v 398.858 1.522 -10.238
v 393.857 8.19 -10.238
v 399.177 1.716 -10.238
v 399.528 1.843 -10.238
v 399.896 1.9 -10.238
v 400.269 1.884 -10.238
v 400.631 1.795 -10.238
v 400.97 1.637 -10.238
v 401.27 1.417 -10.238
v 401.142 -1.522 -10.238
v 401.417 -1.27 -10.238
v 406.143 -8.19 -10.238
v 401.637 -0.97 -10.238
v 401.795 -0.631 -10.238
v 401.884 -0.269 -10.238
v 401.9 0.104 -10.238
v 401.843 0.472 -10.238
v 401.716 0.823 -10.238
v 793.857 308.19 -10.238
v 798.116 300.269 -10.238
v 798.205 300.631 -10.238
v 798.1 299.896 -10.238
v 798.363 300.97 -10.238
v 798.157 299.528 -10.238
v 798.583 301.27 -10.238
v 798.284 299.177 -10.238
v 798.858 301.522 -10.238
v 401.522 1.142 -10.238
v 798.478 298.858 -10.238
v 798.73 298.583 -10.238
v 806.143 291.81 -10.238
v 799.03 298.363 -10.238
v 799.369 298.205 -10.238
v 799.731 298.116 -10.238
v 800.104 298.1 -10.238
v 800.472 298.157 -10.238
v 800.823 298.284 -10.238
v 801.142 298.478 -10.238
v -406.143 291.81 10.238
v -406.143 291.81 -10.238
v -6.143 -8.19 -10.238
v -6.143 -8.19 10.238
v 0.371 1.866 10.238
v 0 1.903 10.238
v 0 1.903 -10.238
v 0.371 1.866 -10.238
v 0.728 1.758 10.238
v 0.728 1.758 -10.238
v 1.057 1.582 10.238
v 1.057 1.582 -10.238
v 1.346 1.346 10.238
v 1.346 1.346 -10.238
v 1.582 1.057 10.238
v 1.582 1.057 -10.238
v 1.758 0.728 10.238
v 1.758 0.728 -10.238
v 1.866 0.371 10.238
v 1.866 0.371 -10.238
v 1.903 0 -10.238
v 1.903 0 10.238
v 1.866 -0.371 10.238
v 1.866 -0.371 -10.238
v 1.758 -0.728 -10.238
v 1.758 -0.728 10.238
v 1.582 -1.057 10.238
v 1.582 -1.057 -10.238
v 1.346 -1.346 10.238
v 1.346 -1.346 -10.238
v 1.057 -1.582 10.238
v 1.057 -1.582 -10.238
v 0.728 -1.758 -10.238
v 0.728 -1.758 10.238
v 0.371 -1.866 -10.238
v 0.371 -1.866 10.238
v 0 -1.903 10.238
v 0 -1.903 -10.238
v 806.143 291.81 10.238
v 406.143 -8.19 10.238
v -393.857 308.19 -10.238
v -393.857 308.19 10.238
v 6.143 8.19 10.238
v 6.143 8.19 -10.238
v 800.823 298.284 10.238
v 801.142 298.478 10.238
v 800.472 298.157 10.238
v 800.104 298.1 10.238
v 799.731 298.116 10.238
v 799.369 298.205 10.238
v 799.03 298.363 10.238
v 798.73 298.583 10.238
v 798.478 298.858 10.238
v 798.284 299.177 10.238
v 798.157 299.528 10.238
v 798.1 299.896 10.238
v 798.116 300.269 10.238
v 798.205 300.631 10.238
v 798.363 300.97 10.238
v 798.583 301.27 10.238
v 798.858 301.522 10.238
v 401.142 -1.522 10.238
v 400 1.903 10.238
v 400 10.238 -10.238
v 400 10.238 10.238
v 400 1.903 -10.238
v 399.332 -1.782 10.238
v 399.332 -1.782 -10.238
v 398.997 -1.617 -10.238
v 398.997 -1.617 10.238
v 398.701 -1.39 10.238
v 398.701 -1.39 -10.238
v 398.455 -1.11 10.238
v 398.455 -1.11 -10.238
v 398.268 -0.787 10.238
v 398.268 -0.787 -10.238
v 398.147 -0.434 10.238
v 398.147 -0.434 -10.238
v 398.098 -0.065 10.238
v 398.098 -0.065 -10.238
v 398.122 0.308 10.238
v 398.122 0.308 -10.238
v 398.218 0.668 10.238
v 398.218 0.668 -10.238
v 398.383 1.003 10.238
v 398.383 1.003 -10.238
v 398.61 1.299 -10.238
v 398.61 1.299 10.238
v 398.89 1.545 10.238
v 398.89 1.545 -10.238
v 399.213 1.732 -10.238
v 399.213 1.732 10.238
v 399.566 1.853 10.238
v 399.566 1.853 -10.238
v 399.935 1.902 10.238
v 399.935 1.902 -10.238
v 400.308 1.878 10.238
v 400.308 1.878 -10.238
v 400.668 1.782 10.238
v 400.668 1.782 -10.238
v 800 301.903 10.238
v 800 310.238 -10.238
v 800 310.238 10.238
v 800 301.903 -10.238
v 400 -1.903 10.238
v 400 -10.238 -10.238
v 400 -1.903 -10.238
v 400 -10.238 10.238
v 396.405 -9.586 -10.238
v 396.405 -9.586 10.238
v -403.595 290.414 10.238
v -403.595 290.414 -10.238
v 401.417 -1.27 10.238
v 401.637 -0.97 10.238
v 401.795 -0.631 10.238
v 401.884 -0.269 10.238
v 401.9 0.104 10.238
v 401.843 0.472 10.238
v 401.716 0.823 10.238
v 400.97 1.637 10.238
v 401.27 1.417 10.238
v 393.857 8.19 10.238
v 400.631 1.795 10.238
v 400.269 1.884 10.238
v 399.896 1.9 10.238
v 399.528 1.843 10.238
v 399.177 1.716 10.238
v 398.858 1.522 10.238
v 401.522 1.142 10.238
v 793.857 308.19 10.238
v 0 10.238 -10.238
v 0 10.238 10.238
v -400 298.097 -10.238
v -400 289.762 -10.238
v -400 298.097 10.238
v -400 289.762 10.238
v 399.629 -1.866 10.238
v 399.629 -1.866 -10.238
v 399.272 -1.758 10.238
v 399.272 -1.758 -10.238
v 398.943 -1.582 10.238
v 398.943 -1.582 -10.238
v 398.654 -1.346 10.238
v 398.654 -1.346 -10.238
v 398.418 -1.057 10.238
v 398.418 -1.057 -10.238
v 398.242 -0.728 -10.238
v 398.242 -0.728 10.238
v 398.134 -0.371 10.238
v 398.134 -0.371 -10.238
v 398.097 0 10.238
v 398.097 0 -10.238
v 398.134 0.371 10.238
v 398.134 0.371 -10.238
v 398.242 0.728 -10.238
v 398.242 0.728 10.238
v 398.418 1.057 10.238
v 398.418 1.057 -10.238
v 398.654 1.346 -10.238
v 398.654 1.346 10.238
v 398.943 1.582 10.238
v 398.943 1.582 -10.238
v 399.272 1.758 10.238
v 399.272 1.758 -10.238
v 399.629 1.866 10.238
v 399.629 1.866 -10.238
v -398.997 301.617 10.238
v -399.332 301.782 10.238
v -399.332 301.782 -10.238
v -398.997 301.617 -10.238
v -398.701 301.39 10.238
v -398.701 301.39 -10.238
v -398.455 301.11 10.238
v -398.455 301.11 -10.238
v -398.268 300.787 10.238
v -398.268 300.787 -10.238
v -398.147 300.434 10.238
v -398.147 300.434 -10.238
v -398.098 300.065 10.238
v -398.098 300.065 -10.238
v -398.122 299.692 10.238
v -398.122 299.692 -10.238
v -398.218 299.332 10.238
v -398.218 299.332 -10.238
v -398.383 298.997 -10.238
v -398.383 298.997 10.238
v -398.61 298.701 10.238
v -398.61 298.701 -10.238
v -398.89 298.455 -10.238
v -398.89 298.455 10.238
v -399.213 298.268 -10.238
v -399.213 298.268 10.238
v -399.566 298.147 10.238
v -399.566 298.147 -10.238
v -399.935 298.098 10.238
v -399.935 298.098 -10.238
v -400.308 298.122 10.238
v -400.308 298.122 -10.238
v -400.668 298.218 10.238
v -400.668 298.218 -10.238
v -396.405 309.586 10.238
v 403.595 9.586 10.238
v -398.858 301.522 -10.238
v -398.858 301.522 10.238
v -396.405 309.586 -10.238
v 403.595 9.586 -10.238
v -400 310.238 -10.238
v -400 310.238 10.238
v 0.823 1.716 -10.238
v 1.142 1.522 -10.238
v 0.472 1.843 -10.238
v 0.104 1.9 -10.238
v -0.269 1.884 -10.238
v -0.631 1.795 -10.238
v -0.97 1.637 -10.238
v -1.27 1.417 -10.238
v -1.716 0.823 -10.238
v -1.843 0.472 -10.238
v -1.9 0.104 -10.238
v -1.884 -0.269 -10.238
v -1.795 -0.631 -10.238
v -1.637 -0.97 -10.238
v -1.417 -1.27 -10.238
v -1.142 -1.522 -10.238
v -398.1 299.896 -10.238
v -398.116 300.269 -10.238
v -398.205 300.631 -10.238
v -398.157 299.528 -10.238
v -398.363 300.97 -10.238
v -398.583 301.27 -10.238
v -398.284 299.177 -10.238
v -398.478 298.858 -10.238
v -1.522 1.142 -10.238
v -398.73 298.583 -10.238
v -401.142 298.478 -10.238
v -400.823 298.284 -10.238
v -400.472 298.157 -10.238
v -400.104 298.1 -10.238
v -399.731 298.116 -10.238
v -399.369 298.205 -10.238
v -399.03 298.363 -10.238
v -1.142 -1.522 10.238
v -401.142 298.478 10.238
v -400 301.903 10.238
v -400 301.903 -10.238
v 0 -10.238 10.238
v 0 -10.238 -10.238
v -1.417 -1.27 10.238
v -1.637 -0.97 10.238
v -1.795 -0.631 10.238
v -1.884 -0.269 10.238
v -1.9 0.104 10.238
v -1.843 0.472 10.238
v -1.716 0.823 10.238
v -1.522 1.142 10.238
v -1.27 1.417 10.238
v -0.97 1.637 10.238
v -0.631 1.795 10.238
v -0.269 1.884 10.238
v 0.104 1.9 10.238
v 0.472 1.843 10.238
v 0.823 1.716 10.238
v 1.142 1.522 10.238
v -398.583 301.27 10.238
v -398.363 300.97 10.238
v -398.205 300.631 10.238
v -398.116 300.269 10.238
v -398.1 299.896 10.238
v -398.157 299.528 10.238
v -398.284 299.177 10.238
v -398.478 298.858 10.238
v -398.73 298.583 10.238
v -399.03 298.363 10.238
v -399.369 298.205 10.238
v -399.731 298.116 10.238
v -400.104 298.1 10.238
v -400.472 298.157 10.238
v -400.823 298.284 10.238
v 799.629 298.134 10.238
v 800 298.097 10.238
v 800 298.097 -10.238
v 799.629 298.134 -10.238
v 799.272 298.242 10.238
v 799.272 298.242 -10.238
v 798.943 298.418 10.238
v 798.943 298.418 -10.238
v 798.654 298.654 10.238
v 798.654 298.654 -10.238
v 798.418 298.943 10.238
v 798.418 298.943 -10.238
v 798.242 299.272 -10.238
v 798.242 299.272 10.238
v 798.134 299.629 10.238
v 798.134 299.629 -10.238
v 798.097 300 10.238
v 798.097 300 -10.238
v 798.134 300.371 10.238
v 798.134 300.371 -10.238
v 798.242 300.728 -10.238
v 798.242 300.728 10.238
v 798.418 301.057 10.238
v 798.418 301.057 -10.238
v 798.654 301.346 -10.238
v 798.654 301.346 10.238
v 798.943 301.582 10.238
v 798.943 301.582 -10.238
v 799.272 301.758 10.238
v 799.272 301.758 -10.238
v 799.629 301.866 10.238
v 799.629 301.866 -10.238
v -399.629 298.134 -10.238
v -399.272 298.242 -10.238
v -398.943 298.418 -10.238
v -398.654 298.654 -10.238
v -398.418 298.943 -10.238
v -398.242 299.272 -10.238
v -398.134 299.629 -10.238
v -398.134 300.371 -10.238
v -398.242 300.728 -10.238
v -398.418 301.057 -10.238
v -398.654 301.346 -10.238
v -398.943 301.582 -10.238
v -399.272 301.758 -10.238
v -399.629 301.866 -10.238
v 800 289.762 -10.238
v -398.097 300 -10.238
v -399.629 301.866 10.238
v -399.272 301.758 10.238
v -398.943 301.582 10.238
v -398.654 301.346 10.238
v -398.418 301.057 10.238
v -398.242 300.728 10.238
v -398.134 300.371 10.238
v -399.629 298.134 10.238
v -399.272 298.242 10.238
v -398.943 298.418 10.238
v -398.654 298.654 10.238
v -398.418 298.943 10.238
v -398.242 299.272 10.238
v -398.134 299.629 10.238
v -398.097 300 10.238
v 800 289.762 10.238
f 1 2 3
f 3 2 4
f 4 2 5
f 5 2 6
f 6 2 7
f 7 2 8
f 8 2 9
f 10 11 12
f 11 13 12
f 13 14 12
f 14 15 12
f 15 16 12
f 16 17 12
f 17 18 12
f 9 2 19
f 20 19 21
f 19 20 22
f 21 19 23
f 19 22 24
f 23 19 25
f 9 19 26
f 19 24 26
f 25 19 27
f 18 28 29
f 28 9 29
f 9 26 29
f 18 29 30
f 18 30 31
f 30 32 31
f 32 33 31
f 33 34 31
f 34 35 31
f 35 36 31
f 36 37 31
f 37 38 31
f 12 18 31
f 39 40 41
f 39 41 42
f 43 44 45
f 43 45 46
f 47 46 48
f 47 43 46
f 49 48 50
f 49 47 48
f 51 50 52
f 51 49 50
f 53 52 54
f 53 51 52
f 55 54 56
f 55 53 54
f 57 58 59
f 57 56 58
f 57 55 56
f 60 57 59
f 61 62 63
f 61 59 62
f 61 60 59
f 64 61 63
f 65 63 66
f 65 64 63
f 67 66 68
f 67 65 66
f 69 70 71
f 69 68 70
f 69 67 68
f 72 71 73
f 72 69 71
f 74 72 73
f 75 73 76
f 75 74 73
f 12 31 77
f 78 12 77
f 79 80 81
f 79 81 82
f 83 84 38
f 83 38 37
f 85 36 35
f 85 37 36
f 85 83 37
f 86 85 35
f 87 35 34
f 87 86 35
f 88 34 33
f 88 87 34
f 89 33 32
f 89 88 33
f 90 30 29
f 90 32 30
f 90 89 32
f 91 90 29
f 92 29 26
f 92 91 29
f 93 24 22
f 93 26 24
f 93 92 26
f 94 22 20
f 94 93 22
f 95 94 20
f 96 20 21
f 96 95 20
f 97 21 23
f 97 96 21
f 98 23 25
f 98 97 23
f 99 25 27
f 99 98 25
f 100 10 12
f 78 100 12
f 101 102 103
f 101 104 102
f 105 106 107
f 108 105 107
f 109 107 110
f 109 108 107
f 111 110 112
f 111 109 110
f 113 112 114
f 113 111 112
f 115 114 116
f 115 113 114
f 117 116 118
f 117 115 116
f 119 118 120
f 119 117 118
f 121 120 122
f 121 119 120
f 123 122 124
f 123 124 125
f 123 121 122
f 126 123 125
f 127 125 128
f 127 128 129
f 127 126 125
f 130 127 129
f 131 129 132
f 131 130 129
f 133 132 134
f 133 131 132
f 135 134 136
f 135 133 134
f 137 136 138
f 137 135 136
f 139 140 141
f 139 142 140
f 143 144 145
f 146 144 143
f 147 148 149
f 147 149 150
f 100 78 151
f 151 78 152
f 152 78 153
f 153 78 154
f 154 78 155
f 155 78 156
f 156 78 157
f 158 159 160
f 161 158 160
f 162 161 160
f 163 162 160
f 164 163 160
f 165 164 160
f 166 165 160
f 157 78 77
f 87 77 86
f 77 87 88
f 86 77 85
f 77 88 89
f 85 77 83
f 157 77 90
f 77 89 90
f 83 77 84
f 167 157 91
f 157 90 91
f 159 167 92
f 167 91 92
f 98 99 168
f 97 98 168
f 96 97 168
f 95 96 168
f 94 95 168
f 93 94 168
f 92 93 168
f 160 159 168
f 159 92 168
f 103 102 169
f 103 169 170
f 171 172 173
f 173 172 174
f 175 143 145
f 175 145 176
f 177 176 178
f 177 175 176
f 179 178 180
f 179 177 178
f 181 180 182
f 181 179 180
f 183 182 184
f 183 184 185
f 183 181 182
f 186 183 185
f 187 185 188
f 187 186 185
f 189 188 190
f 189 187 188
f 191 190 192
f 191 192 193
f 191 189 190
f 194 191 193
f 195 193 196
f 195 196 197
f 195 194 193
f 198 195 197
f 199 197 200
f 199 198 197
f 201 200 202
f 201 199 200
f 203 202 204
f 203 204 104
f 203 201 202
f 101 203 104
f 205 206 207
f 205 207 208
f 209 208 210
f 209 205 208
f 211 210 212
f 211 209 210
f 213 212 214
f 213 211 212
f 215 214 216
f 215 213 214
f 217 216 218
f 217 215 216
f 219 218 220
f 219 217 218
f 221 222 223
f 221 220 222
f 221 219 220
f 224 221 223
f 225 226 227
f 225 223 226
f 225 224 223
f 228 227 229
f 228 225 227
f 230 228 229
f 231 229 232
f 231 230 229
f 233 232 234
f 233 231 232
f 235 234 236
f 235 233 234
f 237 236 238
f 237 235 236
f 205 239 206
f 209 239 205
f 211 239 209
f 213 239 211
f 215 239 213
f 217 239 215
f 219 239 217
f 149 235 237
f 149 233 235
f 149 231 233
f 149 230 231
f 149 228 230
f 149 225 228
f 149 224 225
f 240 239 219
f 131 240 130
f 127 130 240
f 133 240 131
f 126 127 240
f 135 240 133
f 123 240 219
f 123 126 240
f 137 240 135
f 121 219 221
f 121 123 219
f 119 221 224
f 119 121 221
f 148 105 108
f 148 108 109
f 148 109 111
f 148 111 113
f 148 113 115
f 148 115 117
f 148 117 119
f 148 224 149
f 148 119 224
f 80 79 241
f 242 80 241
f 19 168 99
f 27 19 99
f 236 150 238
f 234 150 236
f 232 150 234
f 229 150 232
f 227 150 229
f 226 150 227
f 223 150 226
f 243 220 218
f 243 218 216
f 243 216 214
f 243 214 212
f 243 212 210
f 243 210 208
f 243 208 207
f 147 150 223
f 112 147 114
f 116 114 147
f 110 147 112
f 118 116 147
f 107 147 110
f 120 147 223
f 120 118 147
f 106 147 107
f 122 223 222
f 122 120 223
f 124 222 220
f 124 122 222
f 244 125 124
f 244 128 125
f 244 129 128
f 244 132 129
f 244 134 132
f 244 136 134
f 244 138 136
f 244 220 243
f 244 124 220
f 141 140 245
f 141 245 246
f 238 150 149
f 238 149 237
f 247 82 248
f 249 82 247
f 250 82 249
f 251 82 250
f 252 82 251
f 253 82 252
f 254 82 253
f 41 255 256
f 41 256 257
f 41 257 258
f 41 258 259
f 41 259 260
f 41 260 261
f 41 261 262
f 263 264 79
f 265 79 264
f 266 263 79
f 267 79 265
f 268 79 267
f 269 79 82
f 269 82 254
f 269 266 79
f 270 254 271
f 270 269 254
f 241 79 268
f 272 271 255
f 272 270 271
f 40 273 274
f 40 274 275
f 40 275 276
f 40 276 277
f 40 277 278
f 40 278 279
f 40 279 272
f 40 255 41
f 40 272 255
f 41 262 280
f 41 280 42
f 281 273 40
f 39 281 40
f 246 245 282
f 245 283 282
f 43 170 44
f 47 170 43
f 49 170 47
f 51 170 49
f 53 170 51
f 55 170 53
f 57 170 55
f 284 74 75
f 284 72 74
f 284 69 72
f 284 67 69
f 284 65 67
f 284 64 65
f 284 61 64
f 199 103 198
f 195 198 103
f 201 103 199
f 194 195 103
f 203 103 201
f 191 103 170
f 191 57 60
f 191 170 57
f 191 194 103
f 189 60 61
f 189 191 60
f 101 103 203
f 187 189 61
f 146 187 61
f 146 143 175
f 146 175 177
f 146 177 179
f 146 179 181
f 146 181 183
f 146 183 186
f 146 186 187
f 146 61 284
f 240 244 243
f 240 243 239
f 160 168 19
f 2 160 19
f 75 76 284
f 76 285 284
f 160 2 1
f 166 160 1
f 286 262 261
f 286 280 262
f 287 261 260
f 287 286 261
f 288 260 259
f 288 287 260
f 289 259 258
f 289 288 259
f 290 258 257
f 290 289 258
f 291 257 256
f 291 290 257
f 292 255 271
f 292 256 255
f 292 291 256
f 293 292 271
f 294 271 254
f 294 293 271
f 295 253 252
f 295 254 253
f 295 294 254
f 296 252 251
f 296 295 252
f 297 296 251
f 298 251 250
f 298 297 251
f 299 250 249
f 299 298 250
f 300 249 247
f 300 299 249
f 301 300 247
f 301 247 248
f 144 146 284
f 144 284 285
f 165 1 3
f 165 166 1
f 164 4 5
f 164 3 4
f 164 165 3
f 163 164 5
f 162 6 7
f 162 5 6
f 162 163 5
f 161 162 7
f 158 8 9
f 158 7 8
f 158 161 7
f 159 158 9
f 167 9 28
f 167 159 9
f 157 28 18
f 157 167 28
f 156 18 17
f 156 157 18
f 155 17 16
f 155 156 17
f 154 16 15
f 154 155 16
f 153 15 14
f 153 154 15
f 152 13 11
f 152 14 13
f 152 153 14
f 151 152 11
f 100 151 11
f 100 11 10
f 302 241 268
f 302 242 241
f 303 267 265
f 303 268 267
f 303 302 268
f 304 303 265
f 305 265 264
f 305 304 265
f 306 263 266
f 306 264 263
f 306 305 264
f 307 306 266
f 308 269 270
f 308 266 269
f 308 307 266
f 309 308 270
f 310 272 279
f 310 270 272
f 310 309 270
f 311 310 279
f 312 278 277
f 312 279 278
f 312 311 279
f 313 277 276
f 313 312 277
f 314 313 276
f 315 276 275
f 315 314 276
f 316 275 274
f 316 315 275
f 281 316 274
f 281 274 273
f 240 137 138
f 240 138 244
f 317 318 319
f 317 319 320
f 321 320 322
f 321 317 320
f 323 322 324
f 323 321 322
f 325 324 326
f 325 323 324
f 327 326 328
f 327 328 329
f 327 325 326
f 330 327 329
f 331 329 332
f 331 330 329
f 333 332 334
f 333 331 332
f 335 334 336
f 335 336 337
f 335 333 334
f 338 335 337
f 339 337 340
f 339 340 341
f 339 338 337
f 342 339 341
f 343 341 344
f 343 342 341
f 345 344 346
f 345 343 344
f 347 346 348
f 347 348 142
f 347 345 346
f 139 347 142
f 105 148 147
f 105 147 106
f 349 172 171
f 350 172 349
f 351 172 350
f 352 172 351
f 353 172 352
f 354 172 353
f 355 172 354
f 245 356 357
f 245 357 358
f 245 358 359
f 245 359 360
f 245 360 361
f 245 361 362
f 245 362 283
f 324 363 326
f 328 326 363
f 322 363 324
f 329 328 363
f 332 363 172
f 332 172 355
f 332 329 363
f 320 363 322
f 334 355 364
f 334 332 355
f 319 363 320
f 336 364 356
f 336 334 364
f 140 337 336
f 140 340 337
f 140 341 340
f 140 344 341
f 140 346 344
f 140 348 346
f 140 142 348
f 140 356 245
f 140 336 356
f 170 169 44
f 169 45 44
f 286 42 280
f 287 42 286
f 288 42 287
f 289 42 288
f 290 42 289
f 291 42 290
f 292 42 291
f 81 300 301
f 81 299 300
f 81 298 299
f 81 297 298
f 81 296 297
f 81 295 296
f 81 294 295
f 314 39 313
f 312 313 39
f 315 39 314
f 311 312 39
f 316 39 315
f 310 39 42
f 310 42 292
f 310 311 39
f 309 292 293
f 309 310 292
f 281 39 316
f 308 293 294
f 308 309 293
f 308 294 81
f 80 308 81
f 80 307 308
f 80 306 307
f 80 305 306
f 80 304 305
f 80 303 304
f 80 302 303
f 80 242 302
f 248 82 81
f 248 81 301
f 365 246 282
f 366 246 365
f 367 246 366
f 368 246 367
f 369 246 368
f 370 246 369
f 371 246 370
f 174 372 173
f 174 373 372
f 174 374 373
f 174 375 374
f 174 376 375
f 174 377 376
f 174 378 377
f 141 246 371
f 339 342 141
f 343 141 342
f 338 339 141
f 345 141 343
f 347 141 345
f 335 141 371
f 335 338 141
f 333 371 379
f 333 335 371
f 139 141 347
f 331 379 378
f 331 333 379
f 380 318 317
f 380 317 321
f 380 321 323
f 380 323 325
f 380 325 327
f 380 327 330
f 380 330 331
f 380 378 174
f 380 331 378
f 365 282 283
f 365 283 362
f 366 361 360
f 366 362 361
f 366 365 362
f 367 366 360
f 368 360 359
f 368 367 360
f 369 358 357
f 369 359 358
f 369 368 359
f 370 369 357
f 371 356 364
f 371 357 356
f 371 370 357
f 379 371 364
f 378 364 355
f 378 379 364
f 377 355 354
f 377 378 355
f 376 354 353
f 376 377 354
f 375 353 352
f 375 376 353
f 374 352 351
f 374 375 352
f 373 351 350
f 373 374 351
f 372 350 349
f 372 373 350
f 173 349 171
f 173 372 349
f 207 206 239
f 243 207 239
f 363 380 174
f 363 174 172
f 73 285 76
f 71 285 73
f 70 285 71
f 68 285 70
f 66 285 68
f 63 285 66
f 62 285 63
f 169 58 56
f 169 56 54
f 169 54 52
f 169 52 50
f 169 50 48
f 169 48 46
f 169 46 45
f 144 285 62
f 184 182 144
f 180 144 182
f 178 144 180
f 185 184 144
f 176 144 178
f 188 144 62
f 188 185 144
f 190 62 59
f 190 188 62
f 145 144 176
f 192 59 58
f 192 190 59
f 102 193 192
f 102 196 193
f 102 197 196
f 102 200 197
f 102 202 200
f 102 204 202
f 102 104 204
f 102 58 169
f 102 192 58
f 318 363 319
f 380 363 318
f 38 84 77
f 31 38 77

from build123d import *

# Parameters (mm, degrees)
SKETCH129_W              = 20.47557081
SKETCH129_H              = 20.47557081
SKETCH130_W              = 20.47557081
SKETCH130_H              = 20.47557081
SKETCH131_W              = 20.47557081
SKETCH131_H              = 20.47557081
SKETCH135_W              = 20.47557081
SKETCH135_H              = 20.47557081
SKETCH134_W              = 20.47557081
SKETCH134_H              = 20.47557081
CUT_EXTRUDE10_DEPTH      = 865.021260671
CUT_EXTRUDE10_DEPTH_BACK = 865.021260671
SKETCH154_R              = 1.902917041


with BuildPart() as part:
    # Sweep3: sweep along a path in Sketch2
    with BuildLine(Plane.XY) as sweep3_path:
        Line((-400, 300), (800, 300))
    # Sketch129 → Sweep3 (sweep)
    with BuildSketch(Plane(origin=(0, 0, 0), x_dir=(0, 0, -1), z_dir=(1, 0, 0))):
        with Locations((0, 300)):
            Rectangle(SKETCH129_W, SKETCH129_H)
    sweep(path=sweep3_path.line)


with BuildPart() as body_2:
    # Sweep4: sweep along a path in Sketch123
    with BuildLine(Plane.XY) as sweep4_path:
        Line((0, 0), (400, 0))
    # Sketch130 → Sweep4 (sweep)
    with BuildSketch(Plane(origin=(0, 0, 0), x_dir=(0, 0, -1), z_dir=(1, 0, 0))):
        Rectangle(SKETCH130_W, SKETCH130_H)
    sweep(path=sweep4_path.line)


with BuildPart() as body_3:
    # Sweep5: sweep along a path in Sketch126
    with BuildLine(Plane.XY) as sweep5_path:
        Line((400, 0), (800, 300))
    # Sketch131 → Sweep5 (sweep)
    with BuildSketch(Plane(origin=(800, 300, 0), x_dir=(0, 0, 1), z_dir=(-0.8, -0.6, 0))):
        Rectangle(SKETCH131_W, SKETCH131_H)
    sweep(path=sweep5_path.line)


with BuildPart() as body_4:
    # Sweep6: sweep along a path in Sketch125
    with BuildLine(Plane.XY) as sweep6_path:
        Line((-400, 300), (400, 0))
    # Sketch135 → Sweep6 (sweep)
    with BuildSketch(Plane(origin=(400, 0, 0), x_dir=(0, 0, -1), z_dir=(0.9363291775690445, -0.35112344158839176, 0))):
        Rectangle(SKETCH135_W, SKETCH135_H)
    sweep(path=sweep6_path.line)


with BuildPart() as body_5:
    # Sweep7: sweep along a path in Sketch124
    with BuildLine(Plane.XY) as sweep7_path:
        Line((0, 0), (-400, 300))
    # Sketch134 → Sweep7 (sweep)
    with BuildSketch(Plane(origin=(-400, 300, 0), x_dir=(0, 0, 1), z_dir=(-0.8, 0.6, 0))):
        Rectangle(SKETCH134_W, SKETCH134_H)
    sweep(path=sweep7_path.line)


with BuildPart() as cut_extrude10_tool:
    # Sketch154 → Cut-Extrude10 (new, two sides: drawn at the far end of the back side and taken through both)
    with BuildSketch(Plane(origin=(0, 0, -10.237785405), x_dir=(-1, 0, 0), z_dir=(0, 0, -1)).offset(-CUT_EXTRUDE10_DEPTH_BACK)):
        with Locations((-800, 300)):
            Circle(SKETCH154_R)
        with Locations((-400, 0)):
            Circle(SKETCH154_R)
        Circle(SKETCH154_R)
        with Locations((400, 300)):
            Circle(SKETCH154_R)
    extrude(amount=CUT_EXTRUDE10_DEPTH + CUT_EXTRUDE10_DEPTH_BACK)


with BuildPart() as part_1:
    add(part.part)

    # Cut-Extrude10: cut by cut_extrude10_tool
    add(cut_extrude10_tool.part, mode=Mode.SUBTRACT)


with BuildPart() as body_2_1:
    add(body_2.part)

    # Cut-Extrude10: cut by cut_extrude10_tool
    add(cut_extrude10_tool.part, mode=Mode.SUBTRACT)


with BuildPart() as body_3_1:
    add(body_3.part)

    # Cut-Extrude10: cut by cut_extrude10_tool
    add(cut_extrude10_tool.part, mode=Mode.SUBTRACT)


with BuildPart() as body_4_1:
    add(body_4.part)

    # Cut-Extrude10: cut by cut_extrude10_tool
    add(cut_extrude10_tool.part, mode=Mode.SUBTRACT)


with BuildPart() as body_5_1:
    add(body_5.part)

    # Cut-Extrude10: cut by cut_extrude10_tool
    add(cut_extrude10_tool.part, mode=Mode.SUBTRACT)


solid = Compound([part_1.part, body_2_1.part, body_3_1.part, body_4_1.part, body_5_1.part])
